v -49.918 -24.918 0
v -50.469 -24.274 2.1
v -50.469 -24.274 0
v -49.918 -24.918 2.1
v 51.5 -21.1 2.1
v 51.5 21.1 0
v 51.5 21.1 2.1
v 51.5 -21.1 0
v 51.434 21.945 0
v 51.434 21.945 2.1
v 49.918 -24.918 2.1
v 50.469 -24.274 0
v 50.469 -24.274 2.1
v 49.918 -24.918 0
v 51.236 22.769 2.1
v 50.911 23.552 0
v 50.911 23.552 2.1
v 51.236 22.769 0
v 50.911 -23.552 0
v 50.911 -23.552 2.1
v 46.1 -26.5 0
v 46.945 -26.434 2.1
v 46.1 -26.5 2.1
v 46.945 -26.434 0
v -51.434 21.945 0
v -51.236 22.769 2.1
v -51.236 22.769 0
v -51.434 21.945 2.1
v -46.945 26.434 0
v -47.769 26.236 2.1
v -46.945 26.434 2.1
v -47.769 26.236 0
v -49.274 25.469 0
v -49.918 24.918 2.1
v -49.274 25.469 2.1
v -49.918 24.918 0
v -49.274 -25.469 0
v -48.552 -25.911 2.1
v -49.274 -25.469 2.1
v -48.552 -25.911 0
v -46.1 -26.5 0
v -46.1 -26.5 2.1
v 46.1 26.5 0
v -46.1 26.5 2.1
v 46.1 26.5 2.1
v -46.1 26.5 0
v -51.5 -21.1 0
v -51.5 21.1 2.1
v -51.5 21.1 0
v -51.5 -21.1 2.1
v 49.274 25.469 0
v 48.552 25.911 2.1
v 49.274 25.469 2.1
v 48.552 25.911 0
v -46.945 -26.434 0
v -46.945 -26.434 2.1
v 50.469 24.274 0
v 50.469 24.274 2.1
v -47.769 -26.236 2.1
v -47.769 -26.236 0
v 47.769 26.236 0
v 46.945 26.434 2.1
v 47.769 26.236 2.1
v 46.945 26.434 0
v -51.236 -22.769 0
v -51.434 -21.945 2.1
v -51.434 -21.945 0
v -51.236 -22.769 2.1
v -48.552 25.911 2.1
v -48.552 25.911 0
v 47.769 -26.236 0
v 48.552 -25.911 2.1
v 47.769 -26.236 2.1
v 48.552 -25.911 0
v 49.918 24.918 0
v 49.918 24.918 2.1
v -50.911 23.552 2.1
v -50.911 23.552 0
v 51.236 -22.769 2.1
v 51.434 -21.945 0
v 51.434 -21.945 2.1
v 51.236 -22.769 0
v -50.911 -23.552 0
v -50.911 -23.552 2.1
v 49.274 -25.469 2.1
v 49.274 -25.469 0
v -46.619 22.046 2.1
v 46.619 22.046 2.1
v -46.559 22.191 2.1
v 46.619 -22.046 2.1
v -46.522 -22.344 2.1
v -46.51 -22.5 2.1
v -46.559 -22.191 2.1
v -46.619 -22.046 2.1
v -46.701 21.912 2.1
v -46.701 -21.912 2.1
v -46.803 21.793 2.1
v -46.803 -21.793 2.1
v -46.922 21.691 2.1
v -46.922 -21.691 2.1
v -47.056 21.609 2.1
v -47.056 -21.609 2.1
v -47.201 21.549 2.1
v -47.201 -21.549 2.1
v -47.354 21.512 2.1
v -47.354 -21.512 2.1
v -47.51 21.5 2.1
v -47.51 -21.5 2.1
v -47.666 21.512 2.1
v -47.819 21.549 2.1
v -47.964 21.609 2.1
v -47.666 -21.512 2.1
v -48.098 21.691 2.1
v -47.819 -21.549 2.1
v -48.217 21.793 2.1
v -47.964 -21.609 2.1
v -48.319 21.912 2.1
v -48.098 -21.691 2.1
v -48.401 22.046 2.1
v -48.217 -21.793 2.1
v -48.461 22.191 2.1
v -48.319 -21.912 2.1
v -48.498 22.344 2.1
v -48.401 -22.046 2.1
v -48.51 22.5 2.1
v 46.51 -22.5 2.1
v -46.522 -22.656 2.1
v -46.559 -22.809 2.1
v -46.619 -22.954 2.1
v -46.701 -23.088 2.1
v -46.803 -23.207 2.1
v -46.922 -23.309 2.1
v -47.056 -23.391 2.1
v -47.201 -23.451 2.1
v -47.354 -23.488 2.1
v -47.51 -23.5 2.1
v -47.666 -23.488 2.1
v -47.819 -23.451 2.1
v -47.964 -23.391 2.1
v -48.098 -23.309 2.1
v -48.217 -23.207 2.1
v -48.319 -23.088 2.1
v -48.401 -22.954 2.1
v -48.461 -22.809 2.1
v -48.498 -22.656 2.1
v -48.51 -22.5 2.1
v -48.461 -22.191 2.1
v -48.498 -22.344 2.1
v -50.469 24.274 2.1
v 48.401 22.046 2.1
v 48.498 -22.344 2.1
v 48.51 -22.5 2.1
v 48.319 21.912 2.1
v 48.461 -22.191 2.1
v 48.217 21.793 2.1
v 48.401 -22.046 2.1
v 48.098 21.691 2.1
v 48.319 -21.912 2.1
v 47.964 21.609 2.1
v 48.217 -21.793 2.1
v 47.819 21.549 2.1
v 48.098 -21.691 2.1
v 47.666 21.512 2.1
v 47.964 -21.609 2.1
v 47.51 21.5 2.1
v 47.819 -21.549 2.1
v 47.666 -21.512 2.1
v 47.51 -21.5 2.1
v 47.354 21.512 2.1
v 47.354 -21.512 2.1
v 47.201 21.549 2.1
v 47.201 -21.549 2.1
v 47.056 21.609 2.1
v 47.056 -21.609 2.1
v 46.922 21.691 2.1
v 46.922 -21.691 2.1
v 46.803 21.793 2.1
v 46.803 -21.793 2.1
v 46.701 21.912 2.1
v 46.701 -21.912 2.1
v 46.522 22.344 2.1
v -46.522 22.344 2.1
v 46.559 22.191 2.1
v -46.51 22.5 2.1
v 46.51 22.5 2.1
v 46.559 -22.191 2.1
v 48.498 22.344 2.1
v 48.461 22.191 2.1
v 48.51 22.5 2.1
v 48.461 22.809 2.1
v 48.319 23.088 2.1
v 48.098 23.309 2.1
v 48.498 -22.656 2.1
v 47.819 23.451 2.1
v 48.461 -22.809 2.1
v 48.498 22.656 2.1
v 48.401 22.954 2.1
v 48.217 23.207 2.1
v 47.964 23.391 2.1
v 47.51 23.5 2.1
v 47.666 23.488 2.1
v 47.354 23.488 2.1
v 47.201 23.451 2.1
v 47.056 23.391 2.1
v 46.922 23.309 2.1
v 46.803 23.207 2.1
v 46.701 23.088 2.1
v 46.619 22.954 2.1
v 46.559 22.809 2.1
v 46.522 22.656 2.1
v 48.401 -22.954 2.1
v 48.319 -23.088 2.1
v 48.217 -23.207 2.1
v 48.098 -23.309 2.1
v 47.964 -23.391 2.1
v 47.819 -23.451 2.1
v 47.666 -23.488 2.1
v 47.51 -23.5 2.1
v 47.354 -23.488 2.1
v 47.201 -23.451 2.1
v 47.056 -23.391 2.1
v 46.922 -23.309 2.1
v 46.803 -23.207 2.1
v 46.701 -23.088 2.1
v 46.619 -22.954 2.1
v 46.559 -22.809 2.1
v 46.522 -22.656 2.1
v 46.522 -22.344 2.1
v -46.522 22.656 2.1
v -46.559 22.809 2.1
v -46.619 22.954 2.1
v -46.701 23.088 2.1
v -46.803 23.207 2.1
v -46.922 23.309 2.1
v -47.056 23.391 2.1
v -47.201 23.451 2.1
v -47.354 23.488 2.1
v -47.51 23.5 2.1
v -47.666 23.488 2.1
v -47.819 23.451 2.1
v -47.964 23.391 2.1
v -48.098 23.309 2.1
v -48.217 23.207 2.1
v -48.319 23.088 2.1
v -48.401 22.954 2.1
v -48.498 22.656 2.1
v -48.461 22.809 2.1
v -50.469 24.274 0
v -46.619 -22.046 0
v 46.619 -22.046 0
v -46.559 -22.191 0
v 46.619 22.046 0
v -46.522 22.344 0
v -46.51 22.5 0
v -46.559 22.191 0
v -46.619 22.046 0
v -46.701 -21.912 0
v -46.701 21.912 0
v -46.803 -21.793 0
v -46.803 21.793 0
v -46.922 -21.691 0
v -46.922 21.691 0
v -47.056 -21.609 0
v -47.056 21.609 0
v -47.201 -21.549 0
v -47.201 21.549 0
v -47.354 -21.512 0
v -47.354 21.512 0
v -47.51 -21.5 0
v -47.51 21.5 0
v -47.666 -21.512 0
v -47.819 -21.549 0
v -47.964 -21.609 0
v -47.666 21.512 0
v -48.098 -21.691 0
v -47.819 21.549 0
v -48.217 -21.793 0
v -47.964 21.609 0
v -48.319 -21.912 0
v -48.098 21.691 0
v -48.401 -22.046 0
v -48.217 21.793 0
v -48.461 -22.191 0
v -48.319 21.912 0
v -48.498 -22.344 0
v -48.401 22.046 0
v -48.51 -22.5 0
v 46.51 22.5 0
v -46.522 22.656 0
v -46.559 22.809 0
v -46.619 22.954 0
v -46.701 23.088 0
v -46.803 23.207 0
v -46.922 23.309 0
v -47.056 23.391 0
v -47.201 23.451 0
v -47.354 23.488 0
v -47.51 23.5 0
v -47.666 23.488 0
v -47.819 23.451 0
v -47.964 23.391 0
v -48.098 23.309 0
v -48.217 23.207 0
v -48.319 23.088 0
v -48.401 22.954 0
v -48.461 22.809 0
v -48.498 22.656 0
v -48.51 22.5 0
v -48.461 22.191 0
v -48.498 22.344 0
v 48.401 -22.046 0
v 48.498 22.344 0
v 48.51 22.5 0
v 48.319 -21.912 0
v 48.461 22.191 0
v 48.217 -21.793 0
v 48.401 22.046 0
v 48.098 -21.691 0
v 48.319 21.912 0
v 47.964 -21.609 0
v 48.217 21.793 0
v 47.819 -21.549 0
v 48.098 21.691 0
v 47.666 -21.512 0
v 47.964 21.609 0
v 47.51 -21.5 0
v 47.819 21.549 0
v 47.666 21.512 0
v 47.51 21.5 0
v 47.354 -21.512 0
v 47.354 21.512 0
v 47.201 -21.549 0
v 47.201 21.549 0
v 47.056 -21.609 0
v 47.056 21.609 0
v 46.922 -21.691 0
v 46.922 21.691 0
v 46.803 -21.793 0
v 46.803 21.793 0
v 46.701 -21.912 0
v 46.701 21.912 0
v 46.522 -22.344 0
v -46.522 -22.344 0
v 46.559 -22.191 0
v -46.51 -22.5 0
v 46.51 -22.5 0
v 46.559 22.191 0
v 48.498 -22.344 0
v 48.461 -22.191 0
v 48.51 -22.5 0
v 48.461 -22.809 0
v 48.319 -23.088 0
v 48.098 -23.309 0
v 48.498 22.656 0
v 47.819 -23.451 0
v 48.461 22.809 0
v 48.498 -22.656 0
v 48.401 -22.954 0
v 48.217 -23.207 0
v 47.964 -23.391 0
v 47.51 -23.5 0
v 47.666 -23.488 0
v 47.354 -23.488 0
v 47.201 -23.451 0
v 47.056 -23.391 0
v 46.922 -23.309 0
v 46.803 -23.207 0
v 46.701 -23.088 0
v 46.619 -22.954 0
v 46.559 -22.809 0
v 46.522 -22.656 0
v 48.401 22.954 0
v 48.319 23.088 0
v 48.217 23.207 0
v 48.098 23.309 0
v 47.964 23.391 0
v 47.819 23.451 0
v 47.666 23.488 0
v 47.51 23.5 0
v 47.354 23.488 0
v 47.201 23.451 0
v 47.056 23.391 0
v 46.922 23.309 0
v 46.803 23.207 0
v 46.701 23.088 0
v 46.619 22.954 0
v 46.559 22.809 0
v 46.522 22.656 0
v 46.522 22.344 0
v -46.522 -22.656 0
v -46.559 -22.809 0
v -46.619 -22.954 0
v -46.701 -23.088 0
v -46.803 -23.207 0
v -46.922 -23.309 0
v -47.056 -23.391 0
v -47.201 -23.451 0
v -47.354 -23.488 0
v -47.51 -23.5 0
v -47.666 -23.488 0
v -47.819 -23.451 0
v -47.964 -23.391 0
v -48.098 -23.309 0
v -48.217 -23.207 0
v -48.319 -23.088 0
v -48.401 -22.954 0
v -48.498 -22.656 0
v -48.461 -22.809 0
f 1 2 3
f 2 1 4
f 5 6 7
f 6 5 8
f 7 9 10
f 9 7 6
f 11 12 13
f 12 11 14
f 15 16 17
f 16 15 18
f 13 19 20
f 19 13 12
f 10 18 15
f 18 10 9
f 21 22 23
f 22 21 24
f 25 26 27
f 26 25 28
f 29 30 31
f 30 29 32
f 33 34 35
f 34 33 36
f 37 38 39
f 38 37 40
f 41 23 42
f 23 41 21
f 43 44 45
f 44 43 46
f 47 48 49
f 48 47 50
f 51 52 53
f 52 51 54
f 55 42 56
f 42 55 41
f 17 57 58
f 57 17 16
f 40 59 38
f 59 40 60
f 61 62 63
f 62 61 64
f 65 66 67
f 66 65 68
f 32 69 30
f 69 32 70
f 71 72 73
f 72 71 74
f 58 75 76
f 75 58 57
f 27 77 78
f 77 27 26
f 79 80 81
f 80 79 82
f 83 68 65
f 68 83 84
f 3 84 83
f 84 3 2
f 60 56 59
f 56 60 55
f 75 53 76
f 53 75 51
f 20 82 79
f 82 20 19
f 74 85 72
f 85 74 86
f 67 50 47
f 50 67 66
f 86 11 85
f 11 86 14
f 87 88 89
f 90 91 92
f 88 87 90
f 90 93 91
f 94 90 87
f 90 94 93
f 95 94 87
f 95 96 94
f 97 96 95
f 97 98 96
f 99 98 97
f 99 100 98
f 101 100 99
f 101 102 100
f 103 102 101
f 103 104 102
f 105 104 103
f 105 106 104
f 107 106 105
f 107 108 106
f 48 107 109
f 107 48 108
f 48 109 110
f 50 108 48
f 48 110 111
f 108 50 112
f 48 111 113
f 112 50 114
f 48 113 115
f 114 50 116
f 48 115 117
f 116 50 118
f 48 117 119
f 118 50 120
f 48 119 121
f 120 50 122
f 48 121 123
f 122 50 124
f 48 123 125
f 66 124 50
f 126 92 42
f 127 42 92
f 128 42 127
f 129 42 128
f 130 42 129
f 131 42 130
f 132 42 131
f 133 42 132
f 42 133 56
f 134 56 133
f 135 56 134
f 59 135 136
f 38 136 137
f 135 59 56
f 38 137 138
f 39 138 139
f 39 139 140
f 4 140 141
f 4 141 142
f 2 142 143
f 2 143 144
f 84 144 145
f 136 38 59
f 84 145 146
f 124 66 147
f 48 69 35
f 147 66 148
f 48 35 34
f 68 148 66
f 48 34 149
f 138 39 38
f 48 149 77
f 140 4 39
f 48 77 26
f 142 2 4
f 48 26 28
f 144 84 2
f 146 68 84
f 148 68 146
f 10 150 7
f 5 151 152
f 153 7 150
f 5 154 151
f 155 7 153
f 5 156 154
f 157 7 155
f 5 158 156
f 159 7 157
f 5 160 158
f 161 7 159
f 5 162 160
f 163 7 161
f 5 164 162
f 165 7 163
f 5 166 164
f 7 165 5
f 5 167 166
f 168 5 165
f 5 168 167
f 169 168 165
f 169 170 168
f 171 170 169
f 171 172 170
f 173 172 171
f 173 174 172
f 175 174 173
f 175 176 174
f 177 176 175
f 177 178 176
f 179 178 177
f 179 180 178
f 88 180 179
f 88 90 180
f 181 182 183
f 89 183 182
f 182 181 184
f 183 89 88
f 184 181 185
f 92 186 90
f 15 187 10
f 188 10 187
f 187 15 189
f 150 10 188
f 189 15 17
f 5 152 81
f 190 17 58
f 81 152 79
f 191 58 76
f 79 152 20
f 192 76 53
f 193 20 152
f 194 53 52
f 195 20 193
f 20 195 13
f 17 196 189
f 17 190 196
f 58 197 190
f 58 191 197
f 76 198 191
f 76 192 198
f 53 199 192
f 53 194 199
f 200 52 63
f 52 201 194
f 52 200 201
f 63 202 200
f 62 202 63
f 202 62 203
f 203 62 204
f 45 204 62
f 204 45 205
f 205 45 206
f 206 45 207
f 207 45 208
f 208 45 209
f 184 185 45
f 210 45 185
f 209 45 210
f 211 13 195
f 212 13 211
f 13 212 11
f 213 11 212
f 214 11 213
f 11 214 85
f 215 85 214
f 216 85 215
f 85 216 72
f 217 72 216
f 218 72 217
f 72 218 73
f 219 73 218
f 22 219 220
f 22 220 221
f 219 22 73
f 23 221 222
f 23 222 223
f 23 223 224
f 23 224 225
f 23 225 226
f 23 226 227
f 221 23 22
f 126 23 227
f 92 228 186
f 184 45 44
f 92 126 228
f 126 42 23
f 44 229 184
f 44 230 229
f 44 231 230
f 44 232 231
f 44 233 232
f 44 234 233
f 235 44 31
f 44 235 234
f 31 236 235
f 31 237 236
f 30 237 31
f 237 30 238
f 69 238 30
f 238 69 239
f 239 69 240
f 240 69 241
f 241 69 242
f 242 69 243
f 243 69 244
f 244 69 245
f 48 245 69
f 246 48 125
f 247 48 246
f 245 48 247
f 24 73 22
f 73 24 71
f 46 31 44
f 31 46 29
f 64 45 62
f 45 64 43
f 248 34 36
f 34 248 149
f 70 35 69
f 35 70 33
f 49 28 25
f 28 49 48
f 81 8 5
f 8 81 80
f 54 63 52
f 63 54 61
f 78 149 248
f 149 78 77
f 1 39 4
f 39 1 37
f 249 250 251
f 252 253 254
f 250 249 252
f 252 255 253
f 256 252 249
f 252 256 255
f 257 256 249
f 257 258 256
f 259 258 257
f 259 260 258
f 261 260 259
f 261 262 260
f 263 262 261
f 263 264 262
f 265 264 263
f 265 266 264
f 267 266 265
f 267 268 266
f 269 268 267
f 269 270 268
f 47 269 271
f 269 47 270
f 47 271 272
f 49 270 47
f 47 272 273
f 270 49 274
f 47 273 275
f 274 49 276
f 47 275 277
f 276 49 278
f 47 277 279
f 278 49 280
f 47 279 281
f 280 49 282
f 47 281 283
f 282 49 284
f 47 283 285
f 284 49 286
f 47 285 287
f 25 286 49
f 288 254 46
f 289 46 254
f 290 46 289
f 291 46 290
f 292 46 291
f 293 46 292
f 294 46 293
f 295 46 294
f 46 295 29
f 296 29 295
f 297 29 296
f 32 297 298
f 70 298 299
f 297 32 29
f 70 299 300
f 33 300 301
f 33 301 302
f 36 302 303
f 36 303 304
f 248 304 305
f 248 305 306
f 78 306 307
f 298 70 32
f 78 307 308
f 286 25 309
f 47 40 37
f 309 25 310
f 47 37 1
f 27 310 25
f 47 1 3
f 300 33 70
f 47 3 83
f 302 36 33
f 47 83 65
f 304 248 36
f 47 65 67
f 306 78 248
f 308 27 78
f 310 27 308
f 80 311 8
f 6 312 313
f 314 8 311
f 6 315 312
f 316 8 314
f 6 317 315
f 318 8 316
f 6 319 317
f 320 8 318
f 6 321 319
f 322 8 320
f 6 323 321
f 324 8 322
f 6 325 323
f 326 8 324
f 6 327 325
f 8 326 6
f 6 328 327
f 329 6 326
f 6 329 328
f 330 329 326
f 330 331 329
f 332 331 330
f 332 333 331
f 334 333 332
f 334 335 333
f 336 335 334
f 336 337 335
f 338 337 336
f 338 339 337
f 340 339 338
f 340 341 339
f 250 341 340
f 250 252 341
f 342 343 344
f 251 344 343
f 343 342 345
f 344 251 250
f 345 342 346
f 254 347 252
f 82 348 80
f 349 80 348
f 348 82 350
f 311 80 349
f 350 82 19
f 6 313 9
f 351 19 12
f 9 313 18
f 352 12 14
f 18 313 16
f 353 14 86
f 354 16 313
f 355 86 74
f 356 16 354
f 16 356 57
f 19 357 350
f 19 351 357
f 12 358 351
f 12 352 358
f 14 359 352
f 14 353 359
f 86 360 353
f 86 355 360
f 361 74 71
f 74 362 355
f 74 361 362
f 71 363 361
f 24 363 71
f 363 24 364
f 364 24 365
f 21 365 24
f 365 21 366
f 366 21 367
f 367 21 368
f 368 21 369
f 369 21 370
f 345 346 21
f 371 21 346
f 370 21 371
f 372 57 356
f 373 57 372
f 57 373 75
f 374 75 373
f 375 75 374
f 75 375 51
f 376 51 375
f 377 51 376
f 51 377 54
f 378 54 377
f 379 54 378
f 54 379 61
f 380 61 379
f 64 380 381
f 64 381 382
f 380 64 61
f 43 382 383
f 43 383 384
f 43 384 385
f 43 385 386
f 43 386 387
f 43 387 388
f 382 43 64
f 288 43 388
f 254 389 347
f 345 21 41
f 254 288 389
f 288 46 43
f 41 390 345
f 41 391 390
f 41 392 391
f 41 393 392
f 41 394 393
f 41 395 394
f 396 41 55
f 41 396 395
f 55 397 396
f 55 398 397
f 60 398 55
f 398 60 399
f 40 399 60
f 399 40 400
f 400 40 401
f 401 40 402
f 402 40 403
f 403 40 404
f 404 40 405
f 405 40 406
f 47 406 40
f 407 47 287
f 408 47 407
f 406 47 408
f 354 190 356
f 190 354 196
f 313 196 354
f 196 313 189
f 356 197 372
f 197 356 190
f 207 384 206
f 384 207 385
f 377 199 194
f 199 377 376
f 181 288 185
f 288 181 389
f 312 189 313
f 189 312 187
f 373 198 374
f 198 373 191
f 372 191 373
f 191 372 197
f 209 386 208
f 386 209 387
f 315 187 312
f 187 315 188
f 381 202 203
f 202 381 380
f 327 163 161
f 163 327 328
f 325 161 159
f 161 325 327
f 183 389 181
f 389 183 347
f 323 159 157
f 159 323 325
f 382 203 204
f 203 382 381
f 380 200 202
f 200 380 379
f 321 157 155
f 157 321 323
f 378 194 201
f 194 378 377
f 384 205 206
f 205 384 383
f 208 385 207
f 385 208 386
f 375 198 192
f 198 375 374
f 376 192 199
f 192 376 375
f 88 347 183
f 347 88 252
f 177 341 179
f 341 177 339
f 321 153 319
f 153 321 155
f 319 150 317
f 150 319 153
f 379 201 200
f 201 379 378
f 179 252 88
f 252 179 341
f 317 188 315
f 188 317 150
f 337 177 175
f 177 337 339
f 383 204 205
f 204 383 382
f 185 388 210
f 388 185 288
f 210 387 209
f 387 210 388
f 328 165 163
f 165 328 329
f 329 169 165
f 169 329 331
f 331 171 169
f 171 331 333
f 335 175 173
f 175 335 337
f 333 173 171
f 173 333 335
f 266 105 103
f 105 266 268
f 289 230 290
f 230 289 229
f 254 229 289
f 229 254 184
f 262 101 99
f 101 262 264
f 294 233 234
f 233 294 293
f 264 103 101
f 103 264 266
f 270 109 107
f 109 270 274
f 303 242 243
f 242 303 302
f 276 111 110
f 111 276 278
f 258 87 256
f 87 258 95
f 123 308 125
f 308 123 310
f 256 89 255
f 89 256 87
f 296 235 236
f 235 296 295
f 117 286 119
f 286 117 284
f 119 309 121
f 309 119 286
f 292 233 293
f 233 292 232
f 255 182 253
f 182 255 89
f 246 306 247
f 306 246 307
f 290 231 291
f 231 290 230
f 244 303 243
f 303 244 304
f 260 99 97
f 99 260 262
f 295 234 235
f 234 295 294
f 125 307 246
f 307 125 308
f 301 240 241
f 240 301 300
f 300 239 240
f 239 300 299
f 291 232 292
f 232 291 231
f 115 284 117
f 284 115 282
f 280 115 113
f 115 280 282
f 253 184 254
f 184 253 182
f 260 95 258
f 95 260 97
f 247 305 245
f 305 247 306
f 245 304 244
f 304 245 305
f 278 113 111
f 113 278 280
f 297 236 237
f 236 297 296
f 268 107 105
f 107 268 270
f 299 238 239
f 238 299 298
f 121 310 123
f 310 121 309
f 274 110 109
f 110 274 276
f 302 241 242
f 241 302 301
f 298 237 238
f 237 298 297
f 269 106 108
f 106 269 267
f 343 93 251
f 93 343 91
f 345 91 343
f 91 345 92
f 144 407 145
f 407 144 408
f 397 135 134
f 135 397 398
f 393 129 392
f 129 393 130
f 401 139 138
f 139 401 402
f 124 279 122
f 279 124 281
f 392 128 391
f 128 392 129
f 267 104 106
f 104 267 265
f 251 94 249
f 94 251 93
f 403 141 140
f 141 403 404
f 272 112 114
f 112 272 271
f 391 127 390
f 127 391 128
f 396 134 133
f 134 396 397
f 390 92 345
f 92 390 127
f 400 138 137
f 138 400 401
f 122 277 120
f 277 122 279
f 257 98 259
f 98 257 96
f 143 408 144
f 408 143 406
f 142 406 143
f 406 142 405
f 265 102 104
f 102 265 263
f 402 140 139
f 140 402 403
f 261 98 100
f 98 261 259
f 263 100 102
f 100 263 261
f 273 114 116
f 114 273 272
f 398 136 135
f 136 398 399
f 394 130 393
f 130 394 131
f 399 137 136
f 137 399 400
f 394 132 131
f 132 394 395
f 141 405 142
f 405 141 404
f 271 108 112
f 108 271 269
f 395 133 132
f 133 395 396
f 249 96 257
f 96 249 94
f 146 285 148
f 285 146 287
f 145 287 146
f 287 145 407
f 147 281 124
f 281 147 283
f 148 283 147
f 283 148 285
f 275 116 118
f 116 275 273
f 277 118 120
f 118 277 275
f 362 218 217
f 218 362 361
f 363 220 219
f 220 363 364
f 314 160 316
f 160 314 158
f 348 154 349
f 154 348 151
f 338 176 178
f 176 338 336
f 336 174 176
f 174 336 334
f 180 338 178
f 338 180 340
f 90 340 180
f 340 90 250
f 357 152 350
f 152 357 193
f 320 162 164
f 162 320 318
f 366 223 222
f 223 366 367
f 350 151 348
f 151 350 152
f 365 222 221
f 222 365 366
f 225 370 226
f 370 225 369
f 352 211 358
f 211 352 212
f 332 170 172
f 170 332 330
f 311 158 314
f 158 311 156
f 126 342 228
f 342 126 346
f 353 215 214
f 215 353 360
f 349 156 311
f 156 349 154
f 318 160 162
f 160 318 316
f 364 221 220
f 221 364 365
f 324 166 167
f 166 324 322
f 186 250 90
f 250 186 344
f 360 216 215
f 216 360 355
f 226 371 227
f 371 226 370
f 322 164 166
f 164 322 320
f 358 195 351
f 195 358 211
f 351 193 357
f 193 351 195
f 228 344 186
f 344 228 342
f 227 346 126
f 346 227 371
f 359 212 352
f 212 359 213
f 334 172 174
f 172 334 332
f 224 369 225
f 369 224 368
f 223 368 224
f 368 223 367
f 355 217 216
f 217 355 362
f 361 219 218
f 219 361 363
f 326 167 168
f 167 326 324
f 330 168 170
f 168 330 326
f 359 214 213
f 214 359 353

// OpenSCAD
// file: src/otvory_conf.scad
//Konfigurace pro otvory

//1B) - LCD 2x16
//vzdalenost der
vzdalenost_der_x = 75;
vzdalenost_der_y = 31;
prumer_otvoru = 2.7;
prumer_sloupku = 5;

//ramecek LCD
ramecek_x = 72;
ramecek_y = 23;

//vyska ramecku LCD
ramecek_vyska = 5;
// file: configuration.scad
//UNIBOX04A
//------------------------------------------------------------
///*

rozmer_x=103;
rozmer_y=53;
sila=2;

roztec_srouby_x=95.02;
roztec_srouby_y=45;
prumer_sroubu=2;
zakulaceni_hrany=5.4;

roztec_der=10.16;
pocet_der_osa_x=8;
// file: src/otvory.scad
include <../configuration.scad>
include <otvory_conf.scad>
//Funkce otvuru pro ruzne prvky umistene do celicek

/*OBSAHUJE
    1A)
    1B)
    1C) - Pro modul USBI2C01A
    1D) - Pro konektor MIC338
    1E) - Pro modul UNIPOWER02A
    1F) - Pro modul I2CDIFF01A a RJ45V01A
    1G) - Pro modul UNIPOWER03A
    1H) - Větrací otvor
        
    2A) - Otvor na IR
    2B) - Otvor C1+
    2C) - Otvor na RJ12V01A
    2D) - VLFANT01B
    2E)
    2F)
    2G) - otvor vypinac
    2H) - LCD
*/


/*1C) - Pro modul USBI2C01A
--------------------------------------------------------
--------------------------------------------------------
pocet_der_dane_strany - protoze nelze definovat na jake strane bude dira umistena, proto se musí rucne zadat pocet der zvolene strany krabicky
posun_od_okraje - zadava se o kolik der se ma posunot modul od kraje celicka
vzdalenost_der - definuje roztec der

modul na dvou matkách má vysku 6.5 mm, pokud nebudo zasahne do nastaveni list krabicky, bude nutno zvednout vysku modulu.

*/

module USBI2C01A(tloustka_bocnice,vzdalenost_der) //uz upraveno
{
 USBI2C01A_sirka_kon=12; //sirka konektoru
 USBI2C01A_vyska_kon=11; //vyska konektoru
 USBI2C01A_sirka_mod_otvory=3; //kolik modul zabira der
 USBI2C01A_svyska_nad_plbase=6; //kolik modul zabira der   
   translate([vzdalenost_der*(USBI2C01A_sirka_mod_otvory-1)/2,0,USBI2C01A_vyska_kon/2+USBI2C01A_svyska_nad_plbase])
   cube(size = [USBI2C01A_sirka_kon,tloustka_bocnice+0.2,USBI2C01A_vyska_kon], center = true);  
    
}

/*1D) - Pro konektor MIC338
--------------------------------------------------------
--------------------------------------------------------
*/
//posun_od_okraje - zadava se o kolik der se ma posunot otvor od středu celicka v nasobcich roztece der

module MIC338(tloustka_bocnice,vzdalenost_der,vyska_bocnice)
{
 MIC338_polomer_kon=8; //polomer montazniho otvoru
   translate([0,0,vyska_bocnice/2])
        rotate(a=[90,0,0])
            cylinder(h=tloustka_bocnice+0.1, r=MIC338_polomer_kon+0.1, center=true);  
    
}

/*1E) - Pro modul UNIPOWER02A
--------------------------------------------------------
--------------------------------------------------------
pocet_der_dane_strany - protoze nelze definovat na jake strane bude dira umistena, proto se musí rucne zadat pocet der zvolene strany krabicky
posun_od_okraje - zadava se o kolik der se ma posunot modul od kraje celicka
vzdalenost_der - definuje rozec der

modul na dvou matkách má vysku 6.5 mm, pokud nebudo zasahne do nastaveni list krabicky, bude nutno zvednout vysku modulu.

*/

//uz upraveno

module UNIPOWER02A(tloustka_bocnice,vzdalenost_der)
{
 UNIPOWER02A_sirka_kon=10; //sirka konektoru
 UNIPOWER02A_vyska_kon=11; //vyska konektoru
 UNIPOWER02A_sirka_mod_otvory=4; //kolik modul zabira der
 UNIPOWER02A_vzdalenost_konektoru=6; //vzdalenost kraje konektoru od středu šroubu
    UNIPOWER02A_vyska_nad_plbase=6; //vyska mezi albase a konektorem
   translate([UNIPOWER02A_vzdalenost_konektoru,-tloustka_bocnice/2-0.2,UNIPOWER02A_vyska_nad_plbase])
   cube(size = [UNIPOWER02A_sirka_kon,tloustka_bocnice+0.2,UNIPOWER02A_vyska_kon], center = false);
 }   
 
/*1F) - Pro modul I2CDIFF01A
--------------------------------------------------------
--------------------------------------------------------
pocet_der_dane_strany - protoze nelze definovat na jake strane bude dira umistena, proto se musí rucne zadat pocet der zvolene strany krabicky
posun_od_okraje - zadava se o kolik der se ma posunot modul od kraje celicka
vzdalenost_der - definuje roztec der

modul na dvou matkách má vysku 6.5 mm, pokud nebudo zasahne do nastaveni list krabicky, bude nutno zvednout vysku modulu.

*/


module I2CDIFF01A(tloustka_bocnice,vzdalenost_der) //uz upraveno
{
 I2CDIFF01A_sirka_kon=16.5; //sirka konektoru
 I2CDIFF01A_vyska_kon=13.5; //vyska konektoru
 I2CDIFF01A_sirka_mod_otvory=4; //kolik modul zabira der
 I2CDIFF01A_vyska_nad_plbase=6; //vyska mezi albase a konektorem
   translate([vzdalenost_der*(I2CDIFF01A_sirka_mod_otvory-1)/2,0,I2CDIFF01A_vyska_kon/2+I2CDIFF01A_vyska_nad_plbase])
   cube(size = [I2CDIFF01A_sirka_kon,tloustka_bocnice+0.2,I2CDIFF01A_vyska_kon], center = true);  
    
}
 

/*1G) - Pro modul UNIPOWER03A
--------------------------------------------------------
--------------------------------------------------------

*/

module UNIPOWER03A(tloustka_bocnice,vzdalenost_der)
{
 UNIPOWER03A_sirka_kon=10; //sirka konektoru
 UNIPOWER03A_vyska_kon=11; //vyska konektoru
 UNIPOWER03A_sirka_mod_otvory=4; //kolik modul zabira der
 UNIPOWER03A_vzdalenost_konektoru=5; //vzdalenost kraje konektoru od středu šroubu
    UNIPOWER03A_vyska_nad_plbase=6; //vyska mezi albase a konektorem
    
    
   translate([(UNIPOWER03A_sirka_mod_otvory-1)*vzdalenost_der-UNIPOWER03A_sirka_kon-UNIPOWER03A_vzdalenost_konektoru,-tloustka_bocnice/2-0.05,UNIPOWER03A_vyska_nad_plbase])
   cube(size = [UNIPOWER03A_sirka_kon,tloustka_bocnice+0.1,UNIPOWER03A_vyska_kon], center = false);
 }  
 

 /*1G) - OTVOR PRO VETRANI
--------------------------------------------------------
--------------------------------------------------------

*/
 module CHLADICI_OTVORY(tloustka_bocnice,vzdalenost_der,delka,vyska_bocnice)
{
CHLADICI_OTVORY_mezera=0.6; 
CHLADICI_OTVORY_snizeni_vysky=10; 
CHLADICI_OTVORY_prekryti=1.2;     
    
   for (a =[1:delka]) 
     translate([vzdalenost_der*(a-1),0,0])  
   {   
  union() {
   translate([CHLADICI_OTVORY_prekryti/2,-CHLADICI_OTVORY_mezera/2+0.005,CHLADICI_OTVORY_snizeni_vysky/2])
   cube(size = [(vzdalenost_der-2*CHLADICI_OTVORY_prekryti)/2,(tloustka_bocnice+CHLADICI_OTVORY_mezera)/2,vyska_bocnice-CHLADICI_OTVORY_snizeni_vysky], center = false);
    
     translate([(vzdalenost_der+CHLADICI_OTVORY_prekryti)/2,-tloustka_bocnice/2-0.005,CHLADICI_OTVORY_snizeni_vysky/2])
   cube(size = [(vzdalenost_der-2*CHLADICI_OTVORY_prekryti)/2,(tloustka_bocnice+CHLADICI_OTVORY_mezera)/2,vyska_bocnice-CHLADICI_OTVORY_snizeni_vysky], center = false);
    
    
    translate([(vzdalenost_der-CHLADICI_OTVORY_prekryti)/2,-CHLADICI_OTVORY_mezera/2,CHLADICI_OTVORY_snizeni_vysky/2])
    cube(size = [CHLADICI_OTVORY_prekryti,CHLADICI_OTVORY_mezera,vyska_bocnice-CHLADICI_OTVORY_snizeni_vysky], center = false);
      
    translate([(vzdalenost_der-CHLADICI_OTVORY_prekryti)/2+vzdalenost_der/2,-CHLADICI_OTVORY_mezera/2,CHLADICI_OTVORY_snizeni_vysky/2])
    cube(size = [CHLADICI_OTVORY_prekryti+1,CHLADICI_OTVORY_mezera,vyska_bocnice-CHLADICI_OTVORY_snizeni_vysky], center = false);  
 }
 }
 }
 
 
 /*2A) - OTVOR PRO IR
--------------------------------------------------------
--------------------------------------------------------

*/

 module IR(tloustka_bocnice,vyska_bocnice)
{
    IR_sirka_kon=7; //sirka senzoru
    IR_vyska_kon=7.5; //vyska senzoru
    IR_hloubka_venkovni=1.2; //sila senzoru od vodičů ven
    IR_vyska_pro_vodice=5; 
   
   translate([0,-tloustka_bocnice-1,vyska_bocnice/2-IR_vyska_kon/2])
   cube(size = [IR_sirka_kon,IR_hloubka_venkovni+2,IR_vyska_kon], center = false);
    
    translate([0,-tloustka_bocnice+IR_hloubka_venkovni,vyska_bocnice/2-IR_vyska_kon/2-IR_vyska_pro_vodice])
   cube(size = [IR_sirka_kon,tloustka_bocnice,IR_vyska_kon+IR_vyska_pro_vodice], center = false);
 } 
 
 
 module OTVOR_NA_PRUDUCH(tloustka_bocnice,vzdalenost_der,delka,vyska_bocnice)
{
OTVOR_NA_PRUDUCH_vzdalenost_od_kraje=5; 
    
    
  
     translate([0,-0.05-tloustka_bocnice/2,OTVOR_NA_PRUDUCH_vzdalenost_od_kraje])  
      
  
   cube(size = [vzdalenost_der*(delka),tloustka_bocnice+0.1,vyska_bocnice-2*OTVOR_NA_PRUDUCH_vzdalenost_od_kraje], center = false);
    
     
 
 
 }
 
 
 module CHLADICI_OTVORY2(tloustka_bocnice,vzdalenost_der,delka,vyska_bocnice)
{
CHLADICI_OTVORY2_mezera=1.0; 
CHLADICI_OTVORY2_snizeni_vysky=10; 
    
    
   for (a =[1:delka]) 
     translate([vzdalenost_der*(a-1),0,0])  
   {   

   translate([vzdalenost_der/2,-0.05-tloustka_bocnice/2,CHLADICI_OTVORY2_snizeni_vysky/2])
   cube(size = [CHLADICI_OTVORY2_mezera,tloustka_bocnice+0.1,vyska_bocnice-CHLADICI_OTVORY2_snizeni_vysky], center = false);
    
     
 
 }
 }
 
 /*2B) - Pro C1+
--------------------------------------------------------
--------------------------------------------------------
vzdalenost_der - definuje roztec der

modul na dvou matkách má vysku 6.5 mm, pokud nebudo zasahne do nastaveni list krabicky, bude nutno zvednout vysku modulu.

*/

module C1(tloustka_bocnice,vzdalenost_der) //uz upraveno
{
 C1_sirka_kon=53; //sirka konektoru
 C1_vyska_kon=16; //vyska konektoru
 C1_sirka_mod_otvory=6; //kolik modul zabira der
 C1_svyska_nad_plbase=14; //kolik modul zabira der   
   translate([vzdalenost_der*(C1_sirka_mod_otvory-1)/2,0,C1_vyska_kon/2+C1_svyska_nad_plbase])
   cube(size = [C1_sirka_kon,tloustka_bocnice+0.2,C1_vyska_kon], center = true);  
    
}


/*2C) - RJ12V01A
--------------------------------------------------------
--------------------------------------------------------
vzdalenost_der - definuje roztec der

modul na dvou matkách má vysku 6.5 mm, pokud nebudo zasahne do nastaveni list krabicky, bude nutno zvednout vysku modulu.

*/

module RJ12V01A(tloustka_bocnice,vzdalenost_der) //uz upraveno
{
 RJ12V01A_sirka_kon=15; //sirka konektoru
 RJ12V01A_vyska_kon=13.5; //vyska konektoru
 RJ12V01A_sirka_mod_otvory=5; //kolik modul zabira der
 RJ12V01A_svyska_nad_plbase=6; //kolik modul zabira der   
   translate([vzdalenost_der*(RJ12V01A_sirka_mod_otvory-1)/2-RJ12V01A_sirka_kon/2-0.5,0,RJ12V01A_vyska_kon/2+RJ12V01A_svyska_nad_plbase])
   cube(size = [RJ12V01A_sirka_kon,tloustka_bocnice+0.2,RJ12V01A_vyska_kon], center = true);  
    
}

/*2D) - VLFANT01B
--------------------------------------------------------
--------------------------------------------------------
vzdalenost_der - definuje roztec der

modul na dvou matkách má vysku 6.5 mm, pokud nebudo zasahne do nastaveni list krabicky, bude nutno zvednout vysku modulu.

*/

module VLFANT01B(tloustka_bocnice,vzdalenost_der) //uz upraveno
{
 VLFANT01B_sirka_kon=16.5; //sirka konektoru
 VLFANT01B_vyska_kon=13.5; //vyska konektoru
 VLFANT01B_sirka_mod_otvory=5; //kolik modul zabira der
 VLFANT01B_vyska_nad_plbase=6; //vyska mezi albase a konektorem
   translate([vzdalenost_der*(VLFANT01B_sirka_mod_otvory-1)/2,0,VLFANT01B_vyska_kon/2+VLFANT01B_vyska_nad_plbase])
   cube(size = [VLFANT01B_sirka_kon,tloustka_bocnice+0.2,VLFANT01B_vyska_kon], center = true);  
    
}

/*2E) - GPS01B
--------------------------------------------------------
--------------------------------------------------------
vzdalenost_der - definuje roztec der

modul na dvou matkách má vysku 6.5 mm, pokud nebudo zasahne do nastaveni list krabicky, bude nutno zvednout vysku modulu.

*/

module GPS01B(tloustka_bocnice,vzdalenost_der) //uz upraveno

{
 GPS01B_sirka_kon=12; //sirka konektoru
 GPS01B_vyska_kon=11; //vyska konektoru
 GPS01B_sirka_mod_otvory=4; //kolik modul zabira der
 GPS01B_svyska_nad_plbase=6; //kolik modul zabira der   
   
    translate([vzdalenost_der*(GPS01B_sirka_mod_otvory-1)/2,0,GPS01B_vyska_kon/2+GPS01B_svyska_nad_plbase])
   cube(size = [GPS01B_sirka_kon,tloustka_bocnice+0.2,GPS01B_vyska_kon], center = true);  
    
}

/*2F) - AT32TQ14401A
--------------------------------------------------------
--------------------------------------------------------
vzdalenost_der - definuje roztec der

modul na dvou matkách má vysku 6.5 mm, pokud nebudo zasahne do nastaveni list krabicky, bude nutno zvednout vysku modulu.

*/
module AT32TQ14401A(tloustka_bocnice,vzdalenost_der)
{
 AT32TQ14401A_sirka_kon=12; //sirka konektoru
 AT32TQ14401A_vyska_kon=11; //vyska konektoru
 AT32TQ14401A_sirka_mod_otvory=8; //kolik modul zabira der
 AT32TQ14401A_vzdalenost_konektoru=41.1; //vzdalenost kraje konektoru od středu šroubu
 AT32TQ14401A_vyska_nad_plbase=6; //vyska mezi albase a konektorem
  
    translate([AT32TQ14401A_vzdalenost_konektoru,-tloustka_bocnice/2-0.2,AT32TQ14401A_vyska_nad_plbase])
   cube(size = [AT32TQ14401A_sirka_kon,tloustka_bocnice+0.2,AT32TQ14401A_vyska_kon], center = false);
 } 


/*2G) - Pro vypinac otvor 13x19
--------------------------------------------------------
--------------------------------------------------------

*/

module VYPINAC(tloustka_bocnice,vzdalenost_der,vzdalenost) //uz upraveno
{
  Vypinac_sirka_kon=13; //sirka konektoru
  Vypinac_vyska_kon=19; //vyska konektoru
  Vypinac_sirka_mod_otvory=1; //kolik modul zabira der
  Vypinac_vyska_nad_plbase=rozmer_y/2-vzdalenost; //kolik modul zabira der   
   translate([vzdalenost_der*( Vypinac_sirka_mod_otvory-1)/2,0, Vypinac_vyska_nad_plbase])
   cube(size = [ Vypinac_sirka_kon,tloustka_bocnice+0.2, Vypinac_vyska_kon], center = true);  
    
} 

/*2H) - Pro LCD s I2C
--------------------------------------------------------
--------------------------------------------------------

*/

module LCD(tloustka_bocnice,vzdalenost_der,vzdalenost) //uz upraveno
{
  LCD_roztec_x=75.4;
  LCD_roztec_y=31.4;
  LCD_x=71.3;
  LCD_y=24.5; 
  LCD_sroub_prumer=3.2;  
   
  LCD_sirka_mod_otvory=1; //kolik modul zabira der
  LCD_vyska_nad_plbase=rozmer_y/2-vzdalenost; //kolik modul zabira der   
   translate([vzdalenost_der*( LCD_sirka_mod_otvory-1)/2,0, LCD_vyska_nad_plbase])
    
 {   
   cube(size = [ LCD_x,tloustka_bocnice+0.5, LCD_y], center = true);  

rotate([90, 0, 0]) 
    translate([-LCD_roztec_x/2,LCD_roztec_y/2, 0]) 
        cylinder(h=tloustka_bocnice+0.5, r=LCD_sroub_prumer/2, center=true);
  
rotate([90, 0, 0]) 
    translate([LCD_roztec_x/2,LCD_roztec_y/2, 0]) 
        cylinder(h=tloustka_bocnice+0.5, r=LCD_sroub_prumer/2, center=true);   
   
rotate([90, 0, 0]) 
    translate([-LCD_roztec_x/2,-LCD_roztec_y/2, 0]) 
        cylinder(h=tloustka_bocnice+0.5, r=LCD_sroub_prumer/2, center=true);
  
rotate([90, 0, 0]) 
    translate([LCD_roztec_x/2,-LCD_roztec_y/2, 0]) 
        cylinder(h=tloustka_bocnice+0.5, r=LCD_sroub_prumer/2, center=true);     
}     
} 
// file: src/UNIBOX04A_D01.scad
include <../configuration.scad>


//PLBASE ZAKLADNI
//------------------------------------------------------------

UNIBOX04A_D01();

module UNIBOX04A_D01(){

difference () {

translate([-(rozmer_x/2-zakulaceni_hrany),-(rozmer_y/2-zakulaceni_hrany),0]) 
minkowski()
    {
	cube([rozmer_x-2*zakulaceni_hrany,rozmer_y-2*zakulaceni_hrany,sila]);         
        cylinder(r=zakulaceni_hrany,h=0.1);
    }
  
//odecet otvory

translate([roztec_srouby_x/2,roztec_srouby_y/2,0])      
    cylinder(sila*5, d=prumer_sroubu, center=true);   
  
translate([-roztec_srouby_x/2,roztec_srouby_y/2,0])      
    cylinder(sila*5, d=prumer_sroubu, center=true);    

translate([-roztec_srouby_x/2,-roztec_srouby_y/2,0])      
    cylinder(sila*5, d=prumer_sroubu, center=true);

translate([roztec_srouby_x/2,-roztec_srouby_y/2,0])      
    cylinder(sila*5, d=prumer_sroubu, center=true);

}
}
// main file
$fn=40; // model faces resolution.
use <src/UNIBOX04A_D01.scad>
use <src/otvory.scad>

include <configuration.scad>
include <src/otvory_conf.scad>


barva_sloupku = "cyan";
barva_listy = "red";
barva_celicka = "green";
barva_plbase = "yellow";

//Předni čeličko
//------------------------------------------------------------

vzdalenost_AL=8.3; //vzdalenost od hrany čelíčka k vrchní hraně ALbase 9

difference() {
color(barva_sloupku)
translate([0,0,0])
UNIBOX04A_D01();

  
 
    
     }  
     
    
